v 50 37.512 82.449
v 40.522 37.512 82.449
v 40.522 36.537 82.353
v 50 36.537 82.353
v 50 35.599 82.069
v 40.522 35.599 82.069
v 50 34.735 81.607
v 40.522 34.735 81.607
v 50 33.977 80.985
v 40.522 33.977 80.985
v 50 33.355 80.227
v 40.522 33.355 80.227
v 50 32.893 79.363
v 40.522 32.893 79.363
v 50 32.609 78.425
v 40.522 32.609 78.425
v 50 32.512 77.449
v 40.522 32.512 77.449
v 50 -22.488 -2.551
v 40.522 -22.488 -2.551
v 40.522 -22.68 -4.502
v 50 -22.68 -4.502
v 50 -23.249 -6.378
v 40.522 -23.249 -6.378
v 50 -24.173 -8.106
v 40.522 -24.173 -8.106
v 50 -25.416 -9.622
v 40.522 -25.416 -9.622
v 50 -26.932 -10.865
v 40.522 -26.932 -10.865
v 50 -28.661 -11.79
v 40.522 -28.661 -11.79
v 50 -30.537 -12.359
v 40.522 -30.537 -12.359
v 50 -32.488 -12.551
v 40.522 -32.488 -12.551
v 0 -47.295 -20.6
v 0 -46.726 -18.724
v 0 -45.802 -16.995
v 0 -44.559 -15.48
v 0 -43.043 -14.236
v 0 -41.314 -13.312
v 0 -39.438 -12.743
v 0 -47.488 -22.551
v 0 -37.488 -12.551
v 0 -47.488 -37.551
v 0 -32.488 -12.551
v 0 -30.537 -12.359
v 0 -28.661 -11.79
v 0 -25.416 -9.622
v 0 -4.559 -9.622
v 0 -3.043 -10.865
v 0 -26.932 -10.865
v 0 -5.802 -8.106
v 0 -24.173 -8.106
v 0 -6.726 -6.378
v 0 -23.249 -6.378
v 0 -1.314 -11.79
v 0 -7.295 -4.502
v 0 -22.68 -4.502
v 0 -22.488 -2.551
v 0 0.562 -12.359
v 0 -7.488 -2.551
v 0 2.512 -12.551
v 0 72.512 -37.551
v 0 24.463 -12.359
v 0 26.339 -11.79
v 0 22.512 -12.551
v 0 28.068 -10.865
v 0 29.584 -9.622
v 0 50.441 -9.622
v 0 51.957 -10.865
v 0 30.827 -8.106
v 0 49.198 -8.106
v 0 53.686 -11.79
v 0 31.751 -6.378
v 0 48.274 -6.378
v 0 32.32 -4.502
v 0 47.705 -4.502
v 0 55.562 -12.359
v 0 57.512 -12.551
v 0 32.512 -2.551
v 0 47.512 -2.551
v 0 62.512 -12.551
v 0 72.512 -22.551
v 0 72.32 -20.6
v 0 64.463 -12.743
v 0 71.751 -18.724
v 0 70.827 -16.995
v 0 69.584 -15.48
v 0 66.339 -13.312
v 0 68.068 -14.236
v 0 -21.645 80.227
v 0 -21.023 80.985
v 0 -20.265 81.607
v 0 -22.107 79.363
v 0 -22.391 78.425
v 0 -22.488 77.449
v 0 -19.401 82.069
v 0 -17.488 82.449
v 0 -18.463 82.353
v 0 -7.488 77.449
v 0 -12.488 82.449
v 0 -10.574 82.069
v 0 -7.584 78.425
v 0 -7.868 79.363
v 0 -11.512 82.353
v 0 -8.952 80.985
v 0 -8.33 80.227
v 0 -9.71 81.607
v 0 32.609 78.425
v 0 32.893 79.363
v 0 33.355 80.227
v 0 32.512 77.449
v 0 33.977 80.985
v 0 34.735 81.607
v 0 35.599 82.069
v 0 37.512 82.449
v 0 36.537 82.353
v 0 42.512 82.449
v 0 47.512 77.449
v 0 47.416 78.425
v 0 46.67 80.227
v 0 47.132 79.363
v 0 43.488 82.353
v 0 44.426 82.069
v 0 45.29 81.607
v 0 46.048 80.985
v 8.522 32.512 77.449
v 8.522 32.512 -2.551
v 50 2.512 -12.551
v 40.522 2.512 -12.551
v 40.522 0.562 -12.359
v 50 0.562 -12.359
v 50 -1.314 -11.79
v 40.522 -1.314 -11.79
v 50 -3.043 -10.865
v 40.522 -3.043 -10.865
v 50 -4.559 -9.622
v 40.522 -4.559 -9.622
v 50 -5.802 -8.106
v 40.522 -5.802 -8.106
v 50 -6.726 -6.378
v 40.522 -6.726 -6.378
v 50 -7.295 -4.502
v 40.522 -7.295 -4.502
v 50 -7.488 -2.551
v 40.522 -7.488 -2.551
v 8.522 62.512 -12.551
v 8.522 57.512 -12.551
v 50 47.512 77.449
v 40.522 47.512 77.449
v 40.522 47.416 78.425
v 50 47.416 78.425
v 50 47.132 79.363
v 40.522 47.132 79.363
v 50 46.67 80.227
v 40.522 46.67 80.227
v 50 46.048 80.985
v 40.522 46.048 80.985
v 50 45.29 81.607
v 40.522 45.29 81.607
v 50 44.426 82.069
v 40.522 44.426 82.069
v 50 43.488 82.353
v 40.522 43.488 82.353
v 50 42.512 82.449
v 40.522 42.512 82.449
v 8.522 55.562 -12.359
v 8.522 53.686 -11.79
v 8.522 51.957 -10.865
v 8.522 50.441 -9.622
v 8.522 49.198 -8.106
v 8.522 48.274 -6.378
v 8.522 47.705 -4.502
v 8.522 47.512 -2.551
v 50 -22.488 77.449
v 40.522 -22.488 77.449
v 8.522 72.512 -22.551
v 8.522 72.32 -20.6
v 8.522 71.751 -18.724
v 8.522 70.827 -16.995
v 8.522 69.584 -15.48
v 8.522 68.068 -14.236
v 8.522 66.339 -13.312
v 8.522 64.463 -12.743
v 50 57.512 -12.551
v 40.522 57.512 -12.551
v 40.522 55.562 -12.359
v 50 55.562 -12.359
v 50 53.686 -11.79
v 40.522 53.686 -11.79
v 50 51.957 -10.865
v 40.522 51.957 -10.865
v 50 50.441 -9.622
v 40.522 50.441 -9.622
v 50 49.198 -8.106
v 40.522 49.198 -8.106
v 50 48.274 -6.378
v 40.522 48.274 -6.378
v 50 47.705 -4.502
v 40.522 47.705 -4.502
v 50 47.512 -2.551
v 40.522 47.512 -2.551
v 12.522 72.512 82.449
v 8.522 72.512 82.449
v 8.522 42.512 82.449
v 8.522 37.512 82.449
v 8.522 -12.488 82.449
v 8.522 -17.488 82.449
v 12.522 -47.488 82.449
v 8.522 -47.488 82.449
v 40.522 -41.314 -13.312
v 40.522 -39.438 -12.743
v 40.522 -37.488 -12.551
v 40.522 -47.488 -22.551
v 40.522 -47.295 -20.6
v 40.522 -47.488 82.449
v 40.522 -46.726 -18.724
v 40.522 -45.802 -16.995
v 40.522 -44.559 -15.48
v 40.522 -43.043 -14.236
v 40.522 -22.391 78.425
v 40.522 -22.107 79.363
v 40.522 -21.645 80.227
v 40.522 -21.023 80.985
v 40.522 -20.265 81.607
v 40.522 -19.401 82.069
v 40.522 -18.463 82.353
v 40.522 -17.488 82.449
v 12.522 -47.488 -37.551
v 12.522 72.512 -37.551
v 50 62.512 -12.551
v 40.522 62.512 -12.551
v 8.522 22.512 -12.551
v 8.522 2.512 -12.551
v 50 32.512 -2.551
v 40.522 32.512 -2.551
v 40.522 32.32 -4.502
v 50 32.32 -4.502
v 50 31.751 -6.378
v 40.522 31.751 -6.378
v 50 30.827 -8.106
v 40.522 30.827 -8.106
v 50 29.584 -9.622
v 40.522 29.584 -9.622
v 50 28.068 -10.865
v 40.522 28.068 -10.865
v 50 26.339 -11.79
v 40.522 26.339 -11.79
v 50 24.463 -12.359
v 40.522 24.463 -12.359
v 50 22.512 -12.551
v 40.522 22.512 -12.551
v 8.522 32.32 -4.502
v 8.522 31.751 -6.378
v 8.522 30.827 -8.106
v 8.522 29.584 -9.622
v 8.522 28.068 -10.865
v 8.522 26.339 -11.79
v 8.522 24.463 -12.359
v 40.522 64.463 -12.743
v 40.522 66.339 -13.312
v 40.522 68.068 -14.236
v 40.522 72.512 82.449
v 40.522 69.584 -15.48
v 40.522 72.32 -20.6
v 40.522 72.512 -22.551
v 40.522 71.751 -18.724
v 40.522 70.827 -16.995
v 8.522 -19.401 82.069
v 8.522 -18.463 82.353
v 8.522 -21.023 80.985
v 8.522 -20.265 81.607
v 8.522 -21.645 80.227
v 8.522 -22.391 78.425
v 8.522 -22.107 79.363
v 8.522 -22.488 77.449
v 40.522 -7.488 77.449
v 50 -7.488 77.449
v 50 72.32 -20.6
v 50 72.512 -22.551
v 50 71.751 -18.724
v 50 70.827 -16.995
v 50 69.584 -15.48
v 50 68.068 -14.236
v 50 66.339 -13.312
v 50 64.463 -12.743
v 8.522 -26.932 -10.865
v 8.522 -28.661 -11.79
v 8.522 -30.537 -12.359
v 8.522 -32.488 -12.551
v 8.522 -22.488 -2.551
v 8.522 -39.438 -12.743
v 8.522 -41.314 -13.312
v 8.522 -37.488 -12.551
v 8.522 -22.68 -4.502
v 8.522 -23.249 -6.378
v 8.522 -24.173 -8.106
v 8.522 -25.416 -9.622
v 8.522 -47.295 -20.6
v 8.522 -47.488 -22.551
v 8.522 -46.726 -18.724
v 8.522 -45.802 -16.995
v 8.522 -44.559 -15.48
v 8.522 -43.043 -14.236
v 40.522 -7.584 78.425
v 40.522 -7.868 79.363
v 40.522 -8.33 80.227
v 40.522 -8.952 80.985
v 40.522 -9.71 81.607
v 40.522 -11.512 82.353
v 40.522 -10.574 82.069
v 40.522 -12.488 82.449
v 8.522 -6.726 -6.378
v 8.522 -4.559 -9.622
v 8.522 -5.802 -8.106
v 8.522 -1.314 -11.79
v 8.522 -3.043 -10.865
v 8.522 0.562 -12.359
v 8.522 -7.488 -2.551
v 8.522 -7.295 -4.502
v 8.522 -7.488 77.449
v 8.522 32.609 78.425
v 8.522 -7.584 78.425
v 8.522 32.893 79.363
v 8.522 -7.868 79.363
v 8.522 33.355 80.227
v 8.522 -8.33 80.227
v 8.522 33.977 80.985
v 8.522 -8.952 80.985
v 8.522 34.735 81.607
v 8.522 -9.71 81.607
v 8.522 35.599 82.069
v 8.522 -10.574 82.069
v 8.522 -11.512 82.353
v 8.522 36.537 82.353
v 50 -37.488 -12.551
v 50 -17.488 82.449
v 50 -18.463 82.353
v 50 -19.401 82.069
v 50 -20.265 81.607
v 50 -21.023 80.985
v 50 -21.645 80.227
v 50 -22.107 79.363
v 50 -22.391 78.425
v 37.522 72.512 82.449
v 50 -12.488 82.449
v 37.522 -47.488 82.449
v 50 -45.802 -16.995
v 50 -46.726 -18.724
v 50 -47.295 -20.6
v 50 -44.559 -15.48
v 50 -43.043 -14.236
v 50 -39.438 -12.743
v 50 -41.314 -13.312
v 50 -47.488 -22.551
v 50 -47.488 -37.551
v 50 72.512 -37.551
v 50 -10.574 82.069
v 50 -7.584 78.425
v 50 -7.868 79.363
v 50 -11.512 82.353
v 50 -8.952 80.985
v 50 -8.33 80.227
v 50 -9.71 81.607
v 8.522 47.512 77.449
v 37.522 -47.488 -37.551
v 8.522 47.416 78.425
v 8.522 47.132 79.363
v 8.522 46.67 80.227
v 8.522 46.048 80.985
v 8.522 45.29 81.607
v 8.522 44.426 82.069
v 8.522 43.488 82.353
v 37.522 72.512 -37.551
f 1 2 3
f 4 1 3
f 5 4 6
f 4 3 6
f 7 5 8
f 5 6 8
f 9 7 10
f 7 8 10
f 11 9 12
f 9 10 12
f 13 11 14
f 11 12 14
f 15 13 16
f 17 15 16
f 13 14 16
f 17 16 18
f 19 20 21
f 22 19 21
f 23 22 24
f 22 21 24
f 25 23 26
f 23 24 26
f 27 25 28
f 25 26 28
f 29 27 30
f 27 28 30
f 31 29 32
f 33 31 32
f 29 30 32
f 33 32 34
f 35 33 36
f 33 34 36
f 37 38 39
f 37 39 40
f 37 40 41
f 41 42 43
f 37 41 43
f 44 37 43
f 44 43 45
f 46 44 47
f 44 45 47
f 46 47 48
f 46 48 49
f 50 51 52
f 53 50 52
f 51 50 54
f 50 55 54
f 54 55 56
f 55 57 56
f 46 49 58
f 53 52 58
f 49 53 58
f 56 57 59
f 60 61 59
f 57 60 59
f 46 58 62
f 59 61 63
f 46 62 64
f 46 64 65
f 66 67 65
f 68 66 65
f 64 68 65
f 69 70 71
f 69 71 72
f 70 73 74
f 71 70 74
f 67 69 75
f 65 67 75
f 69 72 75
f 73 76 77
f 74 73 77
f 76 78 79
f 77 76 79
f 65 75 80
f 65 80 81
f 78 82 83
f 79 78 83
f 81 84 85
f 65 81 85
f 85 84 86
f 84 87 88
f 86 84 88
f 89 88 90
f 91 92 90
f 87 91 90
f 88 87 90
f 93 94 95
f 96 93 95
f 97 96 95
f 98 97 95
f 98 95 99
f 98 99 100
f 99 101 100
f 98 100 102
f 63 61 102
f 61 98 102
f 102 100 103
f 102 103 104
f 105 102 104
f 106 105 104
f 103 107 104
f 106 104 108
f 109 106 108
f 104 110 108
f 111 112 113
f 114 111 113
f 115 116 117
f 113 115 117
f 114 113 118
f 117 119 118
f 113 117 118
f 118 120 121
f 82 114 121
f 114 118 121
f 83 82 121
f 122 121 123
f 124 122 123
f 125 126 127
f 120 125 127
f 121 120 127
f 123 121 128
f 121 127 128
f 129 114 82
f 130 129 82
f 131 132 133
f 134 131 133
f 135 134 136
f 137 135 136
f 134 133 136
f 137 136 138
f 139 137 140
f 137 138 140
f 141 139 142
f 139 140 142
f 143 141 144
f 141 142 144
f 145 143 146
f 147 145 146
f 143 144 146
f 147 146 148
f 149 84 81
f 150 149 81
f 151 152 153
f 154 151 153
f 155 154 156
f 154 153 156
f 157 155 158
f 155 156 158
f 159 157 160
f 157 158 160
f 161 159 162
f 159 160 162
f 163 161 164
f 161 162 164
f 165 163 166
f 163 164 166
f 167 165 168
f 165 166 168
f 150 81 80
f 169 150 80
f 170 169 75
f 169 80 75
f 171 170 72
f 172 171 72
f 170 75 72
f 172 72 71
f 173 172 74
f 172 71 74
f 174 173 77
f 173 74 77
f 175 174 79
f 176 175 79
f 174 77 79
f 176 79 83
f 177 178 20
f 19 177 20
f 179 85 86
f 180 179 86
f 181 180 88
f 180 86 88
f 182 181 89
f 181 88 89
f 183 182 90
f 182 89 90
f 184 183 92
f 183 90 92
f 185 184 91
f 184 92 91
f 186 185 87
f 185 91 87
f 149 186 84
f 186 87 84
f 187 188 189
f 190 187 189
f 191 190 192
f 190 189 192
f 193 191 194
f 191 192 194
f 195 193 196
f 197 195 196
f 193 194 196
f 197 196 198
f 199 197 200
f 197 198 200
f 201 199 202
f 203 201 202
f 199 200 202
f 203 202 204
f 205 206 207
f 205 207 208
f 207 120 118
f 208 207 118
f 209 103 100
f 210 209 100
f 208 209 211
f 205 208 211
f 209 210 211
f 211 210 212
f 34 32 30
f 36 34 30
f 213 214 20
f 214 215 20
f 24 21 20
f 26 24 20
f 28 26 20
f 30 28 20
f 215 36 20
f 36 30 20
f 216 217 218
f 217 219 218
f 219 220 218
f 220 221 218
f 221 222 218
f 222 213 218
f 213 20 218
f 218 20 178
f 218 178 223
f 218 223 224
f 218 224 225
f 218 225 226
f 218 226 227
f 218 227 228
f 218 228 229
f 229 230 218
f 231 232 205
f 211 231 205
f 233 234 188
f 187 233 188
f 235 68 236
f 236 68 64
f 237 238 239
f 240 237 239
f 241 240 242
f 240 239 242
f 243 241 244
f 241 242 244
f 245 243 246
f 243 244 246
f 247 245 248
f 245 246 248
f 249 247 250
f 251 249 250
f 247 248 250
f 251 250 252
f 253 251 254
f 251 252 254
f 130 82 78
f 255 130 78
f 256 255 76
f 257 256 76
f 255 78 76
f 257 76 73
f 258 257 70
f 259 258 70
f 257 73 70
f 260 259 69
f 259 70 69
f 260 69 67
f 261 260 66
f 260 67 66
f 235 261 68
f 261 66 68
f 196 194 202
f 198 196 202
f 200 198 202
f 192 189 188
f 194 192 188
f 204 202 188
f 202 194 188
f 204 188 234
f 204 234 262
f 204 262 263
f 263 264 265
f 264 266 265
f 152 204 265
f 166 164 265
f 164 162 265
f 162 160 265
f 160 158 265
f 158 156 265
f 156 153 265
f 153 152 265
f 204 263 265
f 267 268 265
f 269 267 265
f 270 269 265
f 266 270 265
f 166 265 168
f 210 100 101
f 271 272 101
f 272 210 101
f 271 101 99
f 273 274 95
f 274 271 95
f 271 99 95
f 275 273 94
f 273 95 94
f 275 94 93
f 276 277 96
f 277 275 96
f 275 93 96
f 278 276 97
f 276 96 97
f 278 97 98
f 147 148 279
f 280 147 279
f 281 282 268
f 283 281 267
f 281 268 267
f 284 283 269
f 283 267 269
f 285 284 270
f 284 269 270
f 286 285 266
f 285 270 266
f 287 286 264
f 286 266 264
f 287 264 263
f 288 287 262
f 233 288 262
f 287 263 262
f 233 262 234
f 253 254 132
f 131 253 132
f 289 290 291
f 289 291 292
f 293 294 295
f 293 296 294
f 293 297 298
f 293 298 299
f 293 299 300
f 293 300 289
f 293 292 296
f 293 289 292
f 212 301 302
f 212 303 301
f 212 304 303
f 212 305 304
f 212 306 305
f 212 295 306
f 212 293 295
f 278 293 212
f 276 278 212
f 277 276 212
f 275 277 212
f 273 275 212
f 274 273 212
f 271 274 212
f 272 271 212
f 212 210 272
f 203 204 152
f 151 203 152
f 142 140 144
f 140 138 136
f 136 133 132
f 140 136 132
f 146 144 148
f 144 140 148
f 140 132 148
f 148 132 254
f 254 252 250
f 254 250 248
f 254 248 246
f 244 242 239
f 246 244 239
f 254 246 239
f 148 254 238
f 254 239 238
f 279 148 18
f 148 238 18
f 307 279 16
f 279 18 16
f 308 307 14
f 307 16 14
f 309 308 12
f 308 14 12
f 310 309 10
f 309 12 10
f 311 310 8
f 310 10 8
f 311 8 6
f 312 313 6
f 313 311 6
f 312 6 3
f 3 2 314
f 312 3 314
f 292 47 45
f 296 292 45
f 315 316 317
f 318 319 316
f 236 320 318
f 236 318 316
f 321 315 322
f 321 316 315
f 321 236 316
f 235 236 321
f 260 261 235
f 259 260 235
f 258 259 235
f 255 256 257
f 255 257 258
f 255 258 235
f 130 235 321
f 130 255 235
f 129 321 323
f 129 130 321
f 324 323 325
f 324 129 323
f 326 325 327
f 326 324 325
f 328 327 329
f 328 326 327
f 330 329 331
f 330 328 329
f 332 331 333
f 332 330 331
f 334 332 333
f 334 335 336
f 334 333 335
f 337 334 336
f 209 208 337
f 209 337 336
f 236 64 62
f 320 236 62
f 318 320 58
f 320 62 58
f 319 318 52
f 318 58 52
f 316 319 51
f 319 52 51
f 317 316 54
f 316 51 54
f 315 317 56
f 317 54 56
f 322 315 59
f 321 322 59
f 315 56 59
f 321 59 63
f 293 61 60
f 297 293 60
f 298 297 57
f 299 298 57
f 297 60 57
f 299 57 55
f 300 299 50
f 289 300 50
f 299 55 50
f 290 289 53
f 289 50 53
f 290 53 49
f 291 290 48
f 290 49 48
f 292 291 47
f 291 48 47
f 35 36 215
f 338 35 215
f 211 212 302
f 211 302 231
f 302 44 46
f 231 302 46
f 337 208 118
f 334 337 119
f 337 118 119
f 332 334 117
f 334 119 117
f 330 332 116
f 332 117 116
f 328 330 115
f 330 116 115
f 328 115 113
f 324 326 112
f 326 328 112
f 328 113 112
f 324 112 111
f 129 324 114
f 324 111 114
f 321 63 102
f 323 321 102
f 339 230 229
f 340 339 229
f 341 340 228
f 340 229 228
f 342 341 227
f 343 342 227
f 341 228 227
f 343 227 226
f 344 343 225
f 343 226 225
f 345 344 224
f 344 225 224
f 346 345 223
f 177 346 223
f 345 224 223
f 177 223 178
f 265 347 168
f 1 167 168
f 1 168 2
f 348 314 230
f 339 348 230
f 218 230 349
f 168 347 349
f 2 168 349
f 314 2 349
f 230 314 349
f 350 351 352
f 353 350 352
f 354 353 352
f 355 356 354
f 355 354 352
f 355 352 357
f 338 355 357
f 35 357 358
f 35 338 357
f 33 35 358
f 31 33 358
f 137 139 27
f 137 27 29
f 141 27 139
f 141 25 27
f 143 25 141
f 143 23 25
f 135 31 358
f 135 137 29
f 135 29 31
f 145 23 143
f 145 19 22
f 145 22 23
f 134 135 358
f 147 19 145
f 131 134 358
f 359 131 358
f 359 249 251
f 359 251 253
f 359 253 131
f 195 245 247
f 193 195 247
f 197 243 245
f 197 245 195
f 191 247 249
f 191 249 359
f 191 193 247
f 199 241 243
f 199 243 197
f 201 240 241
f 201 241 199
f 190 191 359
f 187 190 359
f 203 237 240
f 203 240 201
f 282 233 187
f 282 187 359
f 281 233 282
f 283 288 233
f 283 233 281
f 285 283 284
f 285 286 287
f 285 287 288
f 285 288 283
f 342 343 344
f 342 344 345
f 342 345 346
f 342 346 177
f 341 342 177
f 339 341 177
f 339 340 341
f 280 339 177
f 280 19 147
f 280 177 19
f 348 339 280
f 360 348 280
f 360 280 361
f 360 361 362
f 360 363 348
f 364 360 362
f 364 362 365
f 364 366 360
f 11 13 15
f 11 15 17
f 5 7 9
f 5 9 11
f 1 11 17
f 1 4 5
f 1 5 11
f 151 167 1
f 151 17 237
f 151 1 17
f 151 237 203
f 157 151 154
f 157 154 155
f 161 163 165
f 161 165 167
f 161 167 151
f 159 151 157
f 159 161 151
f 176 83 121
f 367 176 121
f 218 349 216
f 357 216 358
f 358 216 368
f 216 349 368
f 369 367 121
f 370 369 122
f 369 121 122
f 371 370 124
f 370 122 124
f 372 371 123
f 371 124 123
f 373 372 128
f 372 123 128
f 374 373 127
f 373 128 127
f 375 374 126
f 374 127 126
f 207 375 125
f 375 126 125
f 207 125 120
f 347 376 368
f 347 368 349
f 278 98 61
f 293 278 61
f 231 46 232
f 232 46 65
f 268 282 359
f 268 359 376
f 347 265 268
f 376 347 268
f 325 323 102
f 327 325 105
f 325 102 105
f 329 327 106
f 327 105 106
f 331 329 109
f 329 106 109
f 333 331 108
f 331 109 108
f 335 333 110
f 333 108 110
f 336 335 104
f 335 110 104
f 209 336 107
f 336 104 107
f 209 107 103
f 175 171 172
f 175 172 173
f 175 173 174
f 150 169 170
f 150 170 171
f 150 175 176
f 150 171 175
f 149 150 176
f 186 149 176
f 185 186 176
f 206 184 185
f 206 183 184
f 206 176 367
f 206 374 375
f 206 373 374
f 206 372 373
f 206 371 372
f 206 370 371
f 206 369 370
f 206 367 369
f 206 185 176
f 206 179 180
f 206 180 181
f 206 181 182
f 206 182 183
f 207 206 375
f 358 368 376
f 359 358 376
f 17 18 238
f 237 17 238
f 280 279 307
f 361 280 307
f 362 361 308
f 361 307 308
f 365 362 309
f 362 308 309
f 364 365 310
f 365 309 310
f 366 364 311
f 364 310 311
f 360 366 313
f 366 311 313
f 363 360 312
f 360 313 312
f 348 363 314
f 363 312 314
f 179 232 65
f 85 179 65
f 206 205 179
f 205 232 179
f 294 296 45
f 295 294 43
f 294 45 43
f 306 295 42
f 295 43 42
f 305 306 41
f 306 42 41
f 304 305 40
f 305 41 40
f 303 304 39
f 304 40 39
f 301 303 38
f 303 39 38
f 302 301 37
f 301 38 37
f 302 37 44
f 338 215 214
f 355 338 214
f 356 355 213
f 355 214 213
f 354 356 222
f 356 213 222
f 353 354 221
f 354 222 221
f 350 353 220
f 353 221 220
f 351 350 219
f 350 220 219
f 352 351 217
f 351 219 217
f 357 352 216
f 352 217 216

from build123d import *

# Parameters (mm, degrees)
F1_DEPTH = 50
F2_W     = 32
F2_H     = 105
F3_DEPTH = 120
F4_W     = 25
F4_H     = 120
F5_DEPTH = 120.001


with BuildPart() as f1:
    # F0 (on Right) → F1 (new body)
    with BuildSketch(Plane.YZ):
        with BuildLine():
            Line((-32.487517, -12.550725), (-37.487517, -12.550725))
            ThreePointArc((-37.487517, -12.550725), (-44.558585, -15.479657), (-47.487517, -22.550725))
            Line((-47.487517, -22.550725), (-47.487517, -37.550725))
            Line((-47.487517, -37.550725), (72.512483, -37.550725))
            Line((72.512483, -37.550725), (72.512483, -22.550725))
            ThreePointArc((72.512483, -22.550725), (69.583551, -15.479657), (62.512483, -12.550725))
            Line((62.512483, -12.550725), (57.512483, -12.550725))
            ThreePointArc((57.512483, -12.550725), (50.441415, -9.621793), (47.512483, -2.550725))
            Line((47.512483, -2.550725), (47.512483, 77.449275))
            ThreePointArc((47.512483, 77.449275), (46.048017, 80.984809), (42.512483, 82.449275))
            Line((42.512483, 82.449275), (37.512483, 82.449275))
            ThreePointArc((37.512483, 82.449275), (33.976949, 80.984809), (32.512483, 77.449275))
            Line((32.512483, 77.449275), (32.512483, -2.550725))
            ThreePointArc((32.512483, -2.550725), (29.583551, -9.621793), (22.512483, -12.550725))
            Line((22.512483, -12.550725), (2.512483, -12.550725))
            ThreePointArc((2.512483, -12.550725), (-4.558585, -9.621793), (-7.487517, -2.550725))
            Line((-7.487517, -2.550725), (-7.487517, 77.449275))
            ThreePointArc((-7.487517, 77.449275), (-8.951983, 80.984809), (-12.487517, 82.449275))
            Line((-12.487517, 82.449275), (-17.487517, 82.449275))
            ThreePointArc((-17.487517, 82.449275), (-21.023051, 80.984809), (-22.487517, 77.449275))
            Line((-22.487517, 77.449275), (-22.487517, -2.550725))
            ThreePointArc((-22.487517, -2.550725), (-25.416449, -9.621793), (-32.487517, -12.550725))
        make_face()
    extrude(amount=F1_DEPTH)

    # F2 (on face) → F3 (join)
    with BuildSketch(Plane(origin=(0, 72.512483, 0), x_dir=(-1, 0, 0), z_dir=(0, 1, 0))):
        with Locations((-24.522445, 29.949275)):
            Rectangle(F2_W, F2_H)
    extrude(amount=-F3_DEPTH)

    # F4 (on face) → F5 (cut, through all)
    with BuildSketch(Plane(origin=(0, 72.512483, 0), x_dir=(-1, 0, 0), z_dir=(0, 1, 0))):
        with Locations((-25.022445, 22.449275)):
            Rectangle(F4_W, F4_H)
    extrude(amount=-F5_DEPTH, mode=Mode.SUBTRACT)


solid = f1.part
